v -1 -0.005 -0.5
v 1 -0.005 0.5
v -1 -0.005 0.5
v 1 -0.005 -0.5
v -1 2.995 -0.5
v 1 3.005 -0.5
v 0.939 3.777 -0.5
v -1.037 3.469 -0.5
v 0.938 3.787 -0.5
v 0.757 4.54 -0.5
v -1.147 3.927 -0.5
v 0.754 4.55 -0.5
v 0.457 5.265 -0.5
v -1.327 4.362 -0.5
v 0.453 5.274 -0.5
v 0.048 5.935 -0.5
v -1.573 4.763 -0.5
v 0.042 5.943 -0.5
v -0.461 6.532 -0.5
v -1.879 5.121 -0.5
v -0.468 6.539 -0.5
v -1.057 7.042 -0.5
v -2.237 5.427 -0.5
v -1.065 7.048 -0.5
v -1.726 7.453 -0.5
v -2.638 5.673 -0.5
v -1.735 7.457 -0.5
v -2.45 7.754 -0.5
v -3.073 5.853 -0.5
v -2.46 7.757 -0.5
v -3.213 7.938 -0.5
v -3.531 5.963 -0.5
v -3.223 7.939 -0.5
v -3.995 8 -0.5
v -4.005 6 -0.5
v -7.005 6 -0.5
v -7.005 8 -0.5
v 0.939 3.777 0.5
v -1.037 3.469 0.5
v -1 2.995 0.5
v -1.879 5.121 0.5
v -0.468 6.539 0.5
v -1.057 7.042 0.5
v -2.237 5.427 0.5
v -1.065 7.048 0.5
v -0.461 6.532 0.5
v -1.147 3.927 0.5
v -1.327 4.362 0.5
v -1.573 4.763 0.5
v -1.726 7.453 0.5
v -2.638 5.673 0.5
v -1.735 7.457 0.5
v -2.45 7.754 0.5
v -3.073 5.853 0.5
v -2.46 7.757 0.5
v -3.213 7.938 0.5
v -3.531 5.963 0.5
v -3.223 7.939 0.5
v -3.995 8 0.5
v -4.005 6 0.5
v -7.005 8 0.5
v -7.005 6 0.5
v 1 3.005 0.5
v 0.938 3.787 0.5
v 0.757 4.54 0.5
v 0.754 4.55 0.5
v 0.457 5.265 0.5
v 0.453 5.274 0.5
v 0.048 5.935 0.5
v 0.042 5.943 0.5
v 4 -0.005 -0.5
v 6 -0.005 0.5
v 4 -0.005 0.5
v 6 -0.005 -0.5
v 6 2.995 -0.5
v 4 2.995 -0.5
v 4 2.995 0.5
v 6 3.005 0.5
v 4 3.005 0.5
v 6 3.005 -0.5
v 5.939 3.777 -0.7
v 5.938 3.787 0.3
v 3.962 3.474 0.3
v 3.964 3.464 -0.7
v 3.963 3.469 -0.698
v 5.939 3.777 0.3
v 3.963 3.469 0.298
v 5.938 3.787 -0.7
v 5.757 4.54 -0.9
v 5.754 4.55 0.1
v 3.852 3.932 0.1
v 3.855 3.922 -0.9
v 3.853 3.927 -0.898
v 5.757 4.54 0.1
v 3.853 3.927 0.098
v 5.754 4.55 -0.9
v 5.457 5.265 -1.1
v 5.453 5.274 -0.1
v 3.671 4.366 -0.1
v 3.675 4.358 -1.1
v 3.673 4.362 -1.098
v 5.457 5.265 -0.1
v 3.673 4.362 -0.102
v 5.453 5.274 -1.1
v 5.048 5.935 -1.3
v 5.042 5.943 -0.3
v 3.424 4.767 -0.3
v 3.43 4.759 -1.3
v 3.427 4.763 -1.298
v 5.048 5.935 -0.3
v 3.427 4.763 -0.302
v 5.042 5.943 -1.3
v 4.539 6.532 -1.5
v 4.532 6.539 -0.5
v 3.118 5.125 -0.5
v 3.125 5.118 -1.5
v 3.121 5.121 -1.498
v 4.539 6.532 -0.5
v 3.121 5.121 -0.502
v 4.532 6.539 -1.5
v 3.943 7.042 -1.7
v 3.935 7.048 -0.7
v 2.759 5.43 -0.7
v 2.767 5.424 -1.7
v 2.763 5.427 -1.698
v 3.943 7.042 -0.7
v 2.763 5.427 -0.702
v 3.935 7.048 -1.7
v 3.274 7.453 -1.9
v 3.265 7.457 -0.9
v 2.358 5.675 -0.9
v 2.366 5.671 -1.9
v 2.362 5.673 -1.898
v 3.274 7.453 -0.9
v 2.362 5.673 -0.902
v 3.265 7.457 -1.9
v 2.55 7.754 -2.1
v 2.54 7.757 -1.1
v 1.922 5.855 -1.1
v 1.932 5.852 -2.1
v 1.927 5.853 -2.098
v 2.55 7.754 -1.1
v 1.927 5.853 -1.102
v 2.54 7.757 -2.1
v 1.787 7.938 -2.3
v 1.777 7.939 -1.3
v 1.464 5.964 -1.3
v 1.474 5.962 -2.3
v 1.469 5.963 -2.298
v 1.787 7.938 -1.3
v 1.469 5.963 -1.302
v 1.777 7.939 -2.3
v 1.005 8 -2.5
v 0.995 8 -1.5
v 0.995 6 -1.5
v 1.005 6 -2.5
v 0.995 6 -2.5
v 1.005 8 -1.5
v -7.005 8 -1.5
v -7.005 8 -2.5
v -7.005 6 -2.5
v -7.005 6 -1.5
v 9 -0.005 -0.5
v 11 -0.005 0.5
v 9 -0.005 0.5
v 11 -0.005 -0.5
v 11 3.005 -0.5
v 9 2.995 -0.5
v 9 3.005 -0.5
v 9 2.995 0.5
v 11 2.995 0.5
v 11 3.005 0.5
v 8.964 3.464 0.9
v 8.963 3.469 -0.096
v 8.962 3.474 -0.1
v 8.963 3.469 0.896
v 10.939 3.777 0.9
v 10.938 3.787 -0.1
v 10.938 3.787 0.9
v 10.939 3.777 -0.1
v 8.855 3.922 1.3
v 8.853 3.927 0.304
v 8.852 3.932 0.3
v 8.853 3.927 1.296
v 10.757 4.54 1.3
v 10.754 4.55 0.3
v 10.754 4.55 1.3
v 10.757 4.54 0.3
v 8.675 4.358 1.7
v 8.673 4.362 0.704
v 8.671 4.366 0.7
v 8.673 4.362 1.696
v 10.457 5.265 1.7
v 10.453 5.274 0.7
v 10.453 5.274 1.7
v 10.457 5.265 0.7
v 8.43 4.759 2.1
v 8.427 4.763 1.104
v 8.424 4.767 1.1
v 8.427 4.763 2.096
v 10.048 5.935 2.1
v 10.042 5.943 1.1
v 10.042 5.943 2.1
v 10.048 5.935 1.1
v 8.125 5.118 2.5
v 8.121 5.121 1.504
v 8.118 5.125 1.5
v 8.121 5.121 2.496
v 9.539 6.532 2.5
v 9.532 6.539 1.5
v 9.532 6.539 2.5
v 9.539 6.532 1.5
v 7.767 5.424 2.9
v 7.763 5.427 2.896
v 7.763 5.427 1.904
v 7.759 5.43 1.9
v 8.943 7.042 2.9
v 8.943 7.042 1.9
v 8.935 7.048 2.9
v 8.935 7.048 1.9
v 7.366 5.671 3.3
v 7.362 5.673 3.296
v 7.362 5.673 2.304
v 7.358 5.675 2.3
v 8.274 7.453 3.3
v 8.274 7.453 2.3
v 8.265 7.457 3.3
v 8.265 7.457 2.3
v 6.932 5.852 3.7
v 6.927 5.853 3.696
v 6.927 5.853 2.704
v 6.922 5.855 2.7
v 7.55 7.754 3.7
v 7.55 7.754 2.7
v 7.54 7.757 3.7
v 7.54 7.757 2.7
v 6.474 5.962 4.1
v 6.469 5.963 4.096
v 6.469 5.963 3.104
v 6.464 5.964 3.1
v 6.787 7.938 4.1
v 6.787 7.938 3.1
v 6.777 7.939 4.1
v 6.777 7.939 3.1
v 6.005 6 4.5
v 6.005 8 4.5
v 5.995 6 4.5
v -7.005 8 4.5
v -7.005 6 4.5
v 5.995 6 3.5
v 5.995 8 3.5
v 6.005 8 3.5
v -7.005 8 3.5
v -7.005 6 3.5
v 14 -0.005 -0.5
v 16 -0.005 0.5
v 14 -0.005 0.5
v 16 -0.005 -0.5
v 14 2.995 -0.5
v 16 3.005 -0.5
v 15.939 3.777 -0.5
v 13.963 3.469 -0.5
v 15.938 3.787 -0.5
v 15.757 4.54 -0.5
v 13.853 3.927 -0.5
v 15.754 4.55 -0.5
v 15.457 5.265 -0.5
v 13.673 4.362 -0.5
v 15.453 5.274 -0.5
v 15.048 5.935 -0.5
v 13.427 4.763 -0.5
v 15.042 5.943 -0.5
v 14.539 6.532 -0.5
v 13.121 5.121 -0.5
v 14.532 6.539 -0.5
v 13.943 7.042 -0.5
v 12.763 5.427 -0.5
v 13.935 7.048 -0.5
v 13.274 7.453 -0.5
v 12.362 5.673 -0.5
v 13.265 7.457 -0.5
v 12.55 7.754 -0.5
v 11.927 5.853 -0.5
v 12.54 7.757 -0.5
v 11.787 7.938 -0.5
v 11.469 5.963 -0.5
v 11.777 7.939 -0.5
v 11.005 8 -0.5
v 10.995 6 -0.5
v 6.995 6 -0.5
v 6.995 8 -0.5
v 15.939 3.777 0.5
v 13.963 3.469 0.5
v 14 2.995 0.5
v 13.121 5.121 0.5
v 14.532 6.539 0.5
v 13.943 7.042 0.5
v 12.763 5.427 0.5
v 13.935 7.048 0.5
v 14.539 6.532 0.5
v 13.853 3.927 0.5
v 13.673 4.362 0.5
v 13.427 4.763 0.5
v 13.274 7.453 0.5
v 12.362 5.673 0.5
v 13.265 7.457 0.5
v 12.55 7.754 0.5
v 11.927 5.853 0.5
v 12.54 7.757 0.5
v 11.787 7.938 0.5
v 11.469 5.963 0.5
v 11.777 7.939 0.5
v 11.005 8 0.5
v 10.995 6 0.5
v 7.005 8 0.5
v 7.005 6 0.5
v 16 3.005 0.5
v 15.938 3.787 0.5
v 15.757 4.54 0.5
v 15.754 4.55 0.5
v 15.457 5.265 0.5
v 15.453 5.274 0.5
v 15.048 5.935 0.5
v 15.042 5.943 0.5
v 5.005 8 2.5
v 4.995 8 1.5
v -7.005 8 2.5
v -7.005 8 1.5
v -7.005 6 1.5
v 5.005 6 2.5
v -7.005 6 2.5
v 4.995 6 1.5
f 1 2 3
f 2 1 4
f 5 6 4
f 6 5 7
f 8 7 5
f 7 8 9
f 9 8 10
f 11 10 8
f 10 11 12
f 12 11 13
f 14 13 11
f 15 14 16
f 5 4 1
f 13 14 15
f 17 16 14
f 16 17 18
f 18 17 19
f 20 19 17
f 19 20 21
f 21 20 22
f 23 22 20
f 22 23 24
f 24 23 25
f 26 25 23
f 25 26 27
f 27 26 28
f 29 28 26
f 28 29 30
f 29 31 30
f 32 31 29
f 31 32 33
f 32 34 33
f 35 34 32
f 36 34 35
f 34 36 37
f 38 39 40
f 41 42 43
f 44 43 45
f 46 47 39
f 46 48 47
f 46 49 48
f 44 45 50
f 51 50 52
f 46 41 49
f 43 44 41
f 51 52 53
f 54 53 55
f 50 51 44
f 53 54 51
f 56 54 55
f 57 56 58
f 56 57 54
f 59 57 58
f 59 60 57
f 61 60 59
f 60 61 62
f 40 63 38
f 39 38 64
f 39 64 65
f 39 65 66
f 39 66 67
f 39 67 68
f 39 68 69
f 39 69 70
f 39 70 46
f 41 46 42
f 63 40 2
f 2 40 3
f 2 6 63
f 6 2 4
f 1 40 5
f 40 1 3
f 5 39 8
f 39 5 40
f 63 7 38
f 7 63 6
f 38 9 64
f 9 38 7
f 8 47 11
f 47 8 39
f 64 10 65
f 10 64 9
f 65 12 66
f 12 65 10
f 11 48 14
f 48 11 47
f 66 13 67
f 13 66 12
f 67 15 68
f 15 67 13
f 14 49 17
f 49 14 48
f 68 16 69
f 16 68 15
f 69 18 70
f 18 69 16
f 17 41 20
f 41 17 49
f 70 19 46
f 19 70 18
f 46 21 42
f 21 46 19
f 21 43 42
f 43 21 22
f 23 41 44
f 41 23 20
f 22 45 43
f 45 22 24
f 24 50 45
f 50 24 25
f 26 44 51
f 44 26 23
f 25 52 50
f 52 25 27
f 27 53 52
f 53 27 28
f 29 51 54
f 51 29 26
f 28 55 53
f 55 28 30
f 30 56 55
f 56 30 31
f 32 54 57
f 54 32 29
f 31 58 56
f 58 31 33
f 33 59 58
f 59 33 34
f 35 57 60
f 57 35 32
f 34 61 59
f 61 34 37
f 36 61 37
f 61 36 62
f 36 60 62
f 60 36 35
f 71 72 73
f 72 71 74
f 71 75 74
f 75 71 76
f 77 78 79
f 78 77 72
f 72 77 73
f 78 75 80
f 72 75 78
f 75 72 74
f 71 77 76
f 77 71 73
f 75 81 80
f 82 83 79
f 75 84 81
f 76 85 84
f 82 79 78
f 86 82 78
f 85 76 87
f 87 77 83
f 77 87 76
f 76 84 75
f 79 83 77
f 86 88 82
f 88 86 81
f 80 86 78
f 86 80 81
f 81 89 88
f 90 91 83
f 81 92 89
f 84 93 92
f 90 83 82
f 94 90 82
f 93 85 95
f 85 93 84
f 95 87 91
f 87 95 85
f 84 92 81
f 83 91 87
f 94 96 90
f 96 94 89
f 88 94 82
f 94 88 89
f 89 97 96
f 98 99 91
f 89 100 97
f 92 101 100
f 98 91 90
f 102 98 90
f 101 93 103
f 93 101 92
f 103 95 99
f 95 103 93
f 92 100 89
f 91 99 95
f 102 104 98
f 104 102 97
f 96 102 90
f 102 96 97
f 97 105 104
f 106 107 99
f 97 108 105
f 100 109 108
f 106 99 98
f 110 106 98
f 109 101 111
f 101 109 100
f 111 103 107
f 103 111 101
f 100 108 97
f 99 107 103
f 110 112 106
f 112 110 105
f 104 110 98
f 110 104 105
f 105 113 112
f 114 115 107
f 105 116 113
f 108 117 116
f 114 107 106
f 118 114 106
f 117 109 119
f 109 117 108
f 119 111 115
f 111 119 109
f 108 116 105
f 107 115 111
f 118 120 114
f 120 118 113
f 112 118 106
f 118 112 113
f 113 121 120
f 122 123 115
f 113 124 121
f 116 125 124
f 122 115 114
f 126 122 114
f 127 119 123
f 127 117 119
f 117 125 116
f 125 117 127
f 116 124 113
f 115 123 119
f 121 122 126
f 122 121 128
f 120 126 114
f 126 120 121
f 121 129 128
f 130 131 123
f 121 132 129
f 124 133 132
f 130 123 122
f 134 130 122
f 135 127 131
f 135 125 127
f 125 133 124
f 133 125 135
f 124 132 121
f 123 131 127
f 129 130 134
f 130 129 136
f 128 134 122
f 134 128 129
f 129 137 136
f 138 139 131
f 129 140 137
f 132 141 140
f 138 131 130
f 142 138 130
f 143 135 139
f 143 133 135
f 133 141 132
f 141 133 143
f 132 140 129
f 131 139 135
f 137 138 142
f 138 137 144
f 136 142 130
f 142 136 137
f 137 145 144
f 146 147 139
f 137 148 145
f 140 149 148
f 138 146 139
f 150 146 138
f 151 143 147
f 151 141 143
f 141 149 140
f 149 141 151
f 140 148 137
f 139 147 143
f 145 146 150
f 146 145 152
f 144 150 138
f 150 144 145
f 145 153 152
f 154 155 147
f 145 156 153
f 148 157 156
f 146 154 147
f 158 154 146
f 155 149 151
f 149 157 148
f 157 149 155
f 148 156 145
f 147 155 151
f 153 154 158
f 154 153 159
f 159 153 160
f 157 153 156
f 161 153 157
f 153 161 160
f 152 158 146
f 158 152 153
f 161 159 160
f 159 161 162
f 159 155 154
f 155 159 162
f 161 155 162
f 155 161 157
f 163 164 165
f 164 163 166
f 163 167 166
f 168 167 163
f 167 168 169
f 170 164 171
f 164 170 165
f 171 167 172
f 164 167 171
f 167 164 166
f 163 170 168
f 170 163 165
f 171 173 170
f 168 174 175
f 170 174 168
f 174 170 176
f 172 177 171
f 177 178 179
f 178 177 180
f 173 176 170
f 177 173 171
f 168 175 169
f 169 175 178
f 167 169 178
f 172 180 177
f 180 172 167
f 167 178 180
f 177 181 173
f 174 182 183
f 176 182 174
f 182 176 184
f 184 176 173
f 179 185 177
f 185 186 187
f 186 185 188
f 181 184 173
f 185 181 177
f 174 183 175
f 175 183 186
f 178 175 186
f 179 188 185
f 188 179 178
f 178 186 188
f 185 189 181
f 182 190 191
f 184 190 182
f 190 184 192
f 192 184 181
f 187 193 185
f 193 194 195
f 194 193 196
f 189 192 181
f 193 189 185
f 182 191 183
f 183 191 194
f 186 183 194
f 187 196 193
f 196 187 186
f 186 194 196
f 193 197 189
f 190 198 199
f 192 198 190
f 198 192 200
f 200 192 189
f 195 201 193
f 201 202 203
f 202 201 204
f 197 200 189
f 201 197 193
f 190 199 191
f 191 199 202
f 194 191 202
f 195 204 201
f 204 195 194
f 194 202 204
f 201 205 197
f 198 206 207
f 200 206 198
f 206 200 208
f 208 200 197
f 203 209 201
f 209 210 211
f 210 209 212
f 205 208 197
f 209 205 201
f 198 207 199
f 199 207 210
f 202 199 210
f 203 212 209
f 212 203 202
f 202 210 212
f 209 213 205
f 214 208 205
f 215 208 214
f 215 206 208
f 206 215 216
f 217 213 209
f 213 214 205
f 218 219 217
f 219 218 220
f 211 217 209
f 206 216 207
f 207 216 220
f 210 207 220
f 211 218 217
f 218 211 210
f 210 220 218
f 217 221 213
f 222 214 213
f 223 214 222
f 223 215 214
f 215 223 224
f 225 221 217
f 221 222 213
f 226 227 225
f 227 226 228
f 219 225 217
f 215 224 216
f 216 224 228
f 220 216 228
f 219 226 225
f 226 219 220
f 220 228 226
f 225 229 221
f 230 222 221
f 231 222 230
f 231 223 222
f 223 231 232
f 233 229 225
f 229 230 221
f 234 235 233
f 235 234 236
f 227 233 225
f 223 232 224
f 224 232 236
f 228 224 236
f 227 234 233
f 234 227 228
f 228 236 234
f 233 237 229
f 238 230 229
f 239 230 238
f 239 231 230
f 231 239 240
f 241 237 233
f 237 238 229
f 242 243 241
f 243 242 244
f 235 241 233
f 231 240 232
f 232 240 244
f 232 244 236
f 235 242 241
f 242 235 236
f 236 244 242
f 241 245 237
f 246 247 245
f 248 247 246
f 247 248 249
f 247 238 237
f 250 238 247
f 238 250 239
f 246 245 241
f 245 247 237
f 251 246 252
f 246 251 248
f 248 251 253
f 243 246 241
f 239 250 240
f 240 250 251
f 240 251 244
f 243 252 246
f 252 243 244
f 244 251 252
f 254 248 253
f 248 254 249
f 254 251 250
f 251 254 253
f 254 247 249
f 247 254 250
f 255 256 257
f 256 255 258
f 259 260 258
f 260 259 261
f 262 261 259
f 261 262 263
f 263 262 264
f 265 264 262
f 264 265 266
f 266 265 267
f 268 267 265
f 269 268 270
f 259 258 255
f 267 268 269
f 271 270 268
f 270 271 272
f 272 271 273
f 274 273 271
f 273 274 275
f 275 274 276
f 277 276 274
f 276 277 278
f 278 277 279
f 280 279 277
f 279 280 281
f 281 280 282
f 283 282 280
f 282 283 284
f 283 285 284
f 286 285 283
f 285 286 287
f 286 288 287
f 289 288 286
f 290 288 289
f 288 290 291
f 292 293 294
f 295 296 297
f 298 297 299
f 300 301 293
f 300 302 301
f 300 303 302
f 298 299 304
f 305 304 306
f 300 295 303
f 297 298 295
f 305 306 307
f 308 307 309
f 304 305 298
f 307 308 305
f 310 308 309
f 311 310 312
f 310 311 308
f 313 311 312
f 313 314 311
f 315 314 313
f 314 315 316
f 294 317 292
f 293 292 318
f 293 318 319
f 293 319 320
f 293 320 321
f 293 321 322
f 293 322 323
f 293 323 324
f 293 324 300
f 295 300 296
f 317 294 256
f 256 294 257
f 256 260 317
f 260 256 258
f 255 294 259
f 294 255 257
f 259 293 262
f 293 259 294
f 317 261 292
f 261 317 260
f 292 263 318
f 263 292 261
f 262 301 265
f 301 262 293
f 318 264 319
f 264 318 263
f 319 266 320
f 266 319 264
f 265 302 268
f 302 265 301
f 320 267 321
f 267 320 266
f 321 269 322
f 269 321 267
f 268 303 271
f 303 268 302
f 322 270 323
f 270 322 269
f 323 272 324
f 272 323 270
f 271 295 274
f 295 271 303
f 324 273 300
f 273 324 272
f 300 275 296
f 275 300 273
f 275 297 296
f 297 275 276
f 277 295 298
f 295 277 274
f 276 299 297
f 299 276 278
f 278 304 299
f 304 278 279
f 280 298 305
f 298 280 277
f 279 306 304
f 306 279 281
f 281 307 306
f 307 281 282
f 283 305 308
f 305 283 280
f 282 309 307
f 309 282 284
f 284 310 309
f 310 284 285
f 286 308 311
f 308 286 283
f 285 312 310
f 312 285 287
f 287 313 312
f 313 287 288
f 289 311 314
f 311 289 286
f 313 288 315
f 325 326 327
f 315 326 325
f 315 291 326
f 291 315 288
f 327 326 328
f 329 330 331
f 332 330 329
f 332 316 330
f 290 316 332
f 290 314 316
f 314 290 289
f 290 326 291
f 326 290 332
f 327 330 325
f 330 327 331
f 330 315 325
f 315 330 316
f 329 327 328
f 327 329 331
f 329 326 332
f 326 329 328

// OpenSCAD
use <../polychannel.scad>

eps = 0.01;
base_arc_xy = arc_xy_rel_position("cube", [2, eps, 1], radius=4, angle1=0, angle2=90, n=10);
chan1 = [
    ["cube", [2, eps, 1], [0, 0, 0], [0, [0, 0, 1]]],
    ["cube", [2, eps, 1], [0, 3, 0], [0, [0, 0, 1]]],
    each base_arc_xy,
    ["cube", [eps, 2, 1], [-3, 0, 0], [0, [0, 0, 1]]],
];
polychannel(chan1);
echo(get_final_position(chan1));

chan2 = [
    ["cube", [2, eps, 1], [0, 0, 0], [0, [0, 0, 1]]],
    ["cube", [2, eps, 1], [0, 3, 0], [0, [0, 0, 1]]],
    each uniformly_increase_rel_pos_in_z(base_arc_xy, -2),
    ["cube", [eps, 2, 1], [-8, 0, 0], [0, [0, 0, 1]]],
];
translate([5, 0, 0])
    polychannel(chan2);

chan3 = [
    ["cube", [2, eps, 1], [0, 0, 0], [0, [0, 0, 1]]],
    ["cube", [2, eps, 1], [0, 3, 0], [0, [0, 0, 1]]],
    each uniformly_increase_rel_pos_in_z(base_arc_xy, 4),
    ["cube", [eps, 2, 1], [-13, 0, 0], [0, [0, 0, 1]]],
];
translate([10, 0, 0])
    polychannel(chan3);

chan4 = [
    ["cube", [2, eps, 1], [0, 0, 0], [0, [0, 0, 1]]],
    ["cube", [2, eps, 1], [0, 3, 0], [0, [0, 0, 1]]],
    each base_arc_xy,
    ["cube", [eps, 2, 1], [-4, 0, 0], [0, [0, 0, 1]]],
    ["cube", [eps, 2, 1], [-2, 0, 2], [0, [0, 0, 1]]],
    ["cube", [eps, 2, 1], [-12, 0, 0], [0, [0, 0, 1]]],
];
translate([15, 0, 0])
    polychannel(chan4);


// Simple test channel to manually look at modified relative positions in the Console.
arc_test = [
    ["cube", [2, eps, 1], [0, 0, 0], [0, [0, 0, 1]]],
    ["cube", [2, eps, 1], [0, 3, 0], [0, [0, 0, 1]]],
    ["cube", [eps, 2, 1], [-3, 0, 0], [0, [0, 0, 1]]],
];
arc_test_mod = uniformly_increase_rel_pos(arc_test, [0, 0, 1]);
echo();
echo(arc_test);
echo(arc_test_mod);
echo();
